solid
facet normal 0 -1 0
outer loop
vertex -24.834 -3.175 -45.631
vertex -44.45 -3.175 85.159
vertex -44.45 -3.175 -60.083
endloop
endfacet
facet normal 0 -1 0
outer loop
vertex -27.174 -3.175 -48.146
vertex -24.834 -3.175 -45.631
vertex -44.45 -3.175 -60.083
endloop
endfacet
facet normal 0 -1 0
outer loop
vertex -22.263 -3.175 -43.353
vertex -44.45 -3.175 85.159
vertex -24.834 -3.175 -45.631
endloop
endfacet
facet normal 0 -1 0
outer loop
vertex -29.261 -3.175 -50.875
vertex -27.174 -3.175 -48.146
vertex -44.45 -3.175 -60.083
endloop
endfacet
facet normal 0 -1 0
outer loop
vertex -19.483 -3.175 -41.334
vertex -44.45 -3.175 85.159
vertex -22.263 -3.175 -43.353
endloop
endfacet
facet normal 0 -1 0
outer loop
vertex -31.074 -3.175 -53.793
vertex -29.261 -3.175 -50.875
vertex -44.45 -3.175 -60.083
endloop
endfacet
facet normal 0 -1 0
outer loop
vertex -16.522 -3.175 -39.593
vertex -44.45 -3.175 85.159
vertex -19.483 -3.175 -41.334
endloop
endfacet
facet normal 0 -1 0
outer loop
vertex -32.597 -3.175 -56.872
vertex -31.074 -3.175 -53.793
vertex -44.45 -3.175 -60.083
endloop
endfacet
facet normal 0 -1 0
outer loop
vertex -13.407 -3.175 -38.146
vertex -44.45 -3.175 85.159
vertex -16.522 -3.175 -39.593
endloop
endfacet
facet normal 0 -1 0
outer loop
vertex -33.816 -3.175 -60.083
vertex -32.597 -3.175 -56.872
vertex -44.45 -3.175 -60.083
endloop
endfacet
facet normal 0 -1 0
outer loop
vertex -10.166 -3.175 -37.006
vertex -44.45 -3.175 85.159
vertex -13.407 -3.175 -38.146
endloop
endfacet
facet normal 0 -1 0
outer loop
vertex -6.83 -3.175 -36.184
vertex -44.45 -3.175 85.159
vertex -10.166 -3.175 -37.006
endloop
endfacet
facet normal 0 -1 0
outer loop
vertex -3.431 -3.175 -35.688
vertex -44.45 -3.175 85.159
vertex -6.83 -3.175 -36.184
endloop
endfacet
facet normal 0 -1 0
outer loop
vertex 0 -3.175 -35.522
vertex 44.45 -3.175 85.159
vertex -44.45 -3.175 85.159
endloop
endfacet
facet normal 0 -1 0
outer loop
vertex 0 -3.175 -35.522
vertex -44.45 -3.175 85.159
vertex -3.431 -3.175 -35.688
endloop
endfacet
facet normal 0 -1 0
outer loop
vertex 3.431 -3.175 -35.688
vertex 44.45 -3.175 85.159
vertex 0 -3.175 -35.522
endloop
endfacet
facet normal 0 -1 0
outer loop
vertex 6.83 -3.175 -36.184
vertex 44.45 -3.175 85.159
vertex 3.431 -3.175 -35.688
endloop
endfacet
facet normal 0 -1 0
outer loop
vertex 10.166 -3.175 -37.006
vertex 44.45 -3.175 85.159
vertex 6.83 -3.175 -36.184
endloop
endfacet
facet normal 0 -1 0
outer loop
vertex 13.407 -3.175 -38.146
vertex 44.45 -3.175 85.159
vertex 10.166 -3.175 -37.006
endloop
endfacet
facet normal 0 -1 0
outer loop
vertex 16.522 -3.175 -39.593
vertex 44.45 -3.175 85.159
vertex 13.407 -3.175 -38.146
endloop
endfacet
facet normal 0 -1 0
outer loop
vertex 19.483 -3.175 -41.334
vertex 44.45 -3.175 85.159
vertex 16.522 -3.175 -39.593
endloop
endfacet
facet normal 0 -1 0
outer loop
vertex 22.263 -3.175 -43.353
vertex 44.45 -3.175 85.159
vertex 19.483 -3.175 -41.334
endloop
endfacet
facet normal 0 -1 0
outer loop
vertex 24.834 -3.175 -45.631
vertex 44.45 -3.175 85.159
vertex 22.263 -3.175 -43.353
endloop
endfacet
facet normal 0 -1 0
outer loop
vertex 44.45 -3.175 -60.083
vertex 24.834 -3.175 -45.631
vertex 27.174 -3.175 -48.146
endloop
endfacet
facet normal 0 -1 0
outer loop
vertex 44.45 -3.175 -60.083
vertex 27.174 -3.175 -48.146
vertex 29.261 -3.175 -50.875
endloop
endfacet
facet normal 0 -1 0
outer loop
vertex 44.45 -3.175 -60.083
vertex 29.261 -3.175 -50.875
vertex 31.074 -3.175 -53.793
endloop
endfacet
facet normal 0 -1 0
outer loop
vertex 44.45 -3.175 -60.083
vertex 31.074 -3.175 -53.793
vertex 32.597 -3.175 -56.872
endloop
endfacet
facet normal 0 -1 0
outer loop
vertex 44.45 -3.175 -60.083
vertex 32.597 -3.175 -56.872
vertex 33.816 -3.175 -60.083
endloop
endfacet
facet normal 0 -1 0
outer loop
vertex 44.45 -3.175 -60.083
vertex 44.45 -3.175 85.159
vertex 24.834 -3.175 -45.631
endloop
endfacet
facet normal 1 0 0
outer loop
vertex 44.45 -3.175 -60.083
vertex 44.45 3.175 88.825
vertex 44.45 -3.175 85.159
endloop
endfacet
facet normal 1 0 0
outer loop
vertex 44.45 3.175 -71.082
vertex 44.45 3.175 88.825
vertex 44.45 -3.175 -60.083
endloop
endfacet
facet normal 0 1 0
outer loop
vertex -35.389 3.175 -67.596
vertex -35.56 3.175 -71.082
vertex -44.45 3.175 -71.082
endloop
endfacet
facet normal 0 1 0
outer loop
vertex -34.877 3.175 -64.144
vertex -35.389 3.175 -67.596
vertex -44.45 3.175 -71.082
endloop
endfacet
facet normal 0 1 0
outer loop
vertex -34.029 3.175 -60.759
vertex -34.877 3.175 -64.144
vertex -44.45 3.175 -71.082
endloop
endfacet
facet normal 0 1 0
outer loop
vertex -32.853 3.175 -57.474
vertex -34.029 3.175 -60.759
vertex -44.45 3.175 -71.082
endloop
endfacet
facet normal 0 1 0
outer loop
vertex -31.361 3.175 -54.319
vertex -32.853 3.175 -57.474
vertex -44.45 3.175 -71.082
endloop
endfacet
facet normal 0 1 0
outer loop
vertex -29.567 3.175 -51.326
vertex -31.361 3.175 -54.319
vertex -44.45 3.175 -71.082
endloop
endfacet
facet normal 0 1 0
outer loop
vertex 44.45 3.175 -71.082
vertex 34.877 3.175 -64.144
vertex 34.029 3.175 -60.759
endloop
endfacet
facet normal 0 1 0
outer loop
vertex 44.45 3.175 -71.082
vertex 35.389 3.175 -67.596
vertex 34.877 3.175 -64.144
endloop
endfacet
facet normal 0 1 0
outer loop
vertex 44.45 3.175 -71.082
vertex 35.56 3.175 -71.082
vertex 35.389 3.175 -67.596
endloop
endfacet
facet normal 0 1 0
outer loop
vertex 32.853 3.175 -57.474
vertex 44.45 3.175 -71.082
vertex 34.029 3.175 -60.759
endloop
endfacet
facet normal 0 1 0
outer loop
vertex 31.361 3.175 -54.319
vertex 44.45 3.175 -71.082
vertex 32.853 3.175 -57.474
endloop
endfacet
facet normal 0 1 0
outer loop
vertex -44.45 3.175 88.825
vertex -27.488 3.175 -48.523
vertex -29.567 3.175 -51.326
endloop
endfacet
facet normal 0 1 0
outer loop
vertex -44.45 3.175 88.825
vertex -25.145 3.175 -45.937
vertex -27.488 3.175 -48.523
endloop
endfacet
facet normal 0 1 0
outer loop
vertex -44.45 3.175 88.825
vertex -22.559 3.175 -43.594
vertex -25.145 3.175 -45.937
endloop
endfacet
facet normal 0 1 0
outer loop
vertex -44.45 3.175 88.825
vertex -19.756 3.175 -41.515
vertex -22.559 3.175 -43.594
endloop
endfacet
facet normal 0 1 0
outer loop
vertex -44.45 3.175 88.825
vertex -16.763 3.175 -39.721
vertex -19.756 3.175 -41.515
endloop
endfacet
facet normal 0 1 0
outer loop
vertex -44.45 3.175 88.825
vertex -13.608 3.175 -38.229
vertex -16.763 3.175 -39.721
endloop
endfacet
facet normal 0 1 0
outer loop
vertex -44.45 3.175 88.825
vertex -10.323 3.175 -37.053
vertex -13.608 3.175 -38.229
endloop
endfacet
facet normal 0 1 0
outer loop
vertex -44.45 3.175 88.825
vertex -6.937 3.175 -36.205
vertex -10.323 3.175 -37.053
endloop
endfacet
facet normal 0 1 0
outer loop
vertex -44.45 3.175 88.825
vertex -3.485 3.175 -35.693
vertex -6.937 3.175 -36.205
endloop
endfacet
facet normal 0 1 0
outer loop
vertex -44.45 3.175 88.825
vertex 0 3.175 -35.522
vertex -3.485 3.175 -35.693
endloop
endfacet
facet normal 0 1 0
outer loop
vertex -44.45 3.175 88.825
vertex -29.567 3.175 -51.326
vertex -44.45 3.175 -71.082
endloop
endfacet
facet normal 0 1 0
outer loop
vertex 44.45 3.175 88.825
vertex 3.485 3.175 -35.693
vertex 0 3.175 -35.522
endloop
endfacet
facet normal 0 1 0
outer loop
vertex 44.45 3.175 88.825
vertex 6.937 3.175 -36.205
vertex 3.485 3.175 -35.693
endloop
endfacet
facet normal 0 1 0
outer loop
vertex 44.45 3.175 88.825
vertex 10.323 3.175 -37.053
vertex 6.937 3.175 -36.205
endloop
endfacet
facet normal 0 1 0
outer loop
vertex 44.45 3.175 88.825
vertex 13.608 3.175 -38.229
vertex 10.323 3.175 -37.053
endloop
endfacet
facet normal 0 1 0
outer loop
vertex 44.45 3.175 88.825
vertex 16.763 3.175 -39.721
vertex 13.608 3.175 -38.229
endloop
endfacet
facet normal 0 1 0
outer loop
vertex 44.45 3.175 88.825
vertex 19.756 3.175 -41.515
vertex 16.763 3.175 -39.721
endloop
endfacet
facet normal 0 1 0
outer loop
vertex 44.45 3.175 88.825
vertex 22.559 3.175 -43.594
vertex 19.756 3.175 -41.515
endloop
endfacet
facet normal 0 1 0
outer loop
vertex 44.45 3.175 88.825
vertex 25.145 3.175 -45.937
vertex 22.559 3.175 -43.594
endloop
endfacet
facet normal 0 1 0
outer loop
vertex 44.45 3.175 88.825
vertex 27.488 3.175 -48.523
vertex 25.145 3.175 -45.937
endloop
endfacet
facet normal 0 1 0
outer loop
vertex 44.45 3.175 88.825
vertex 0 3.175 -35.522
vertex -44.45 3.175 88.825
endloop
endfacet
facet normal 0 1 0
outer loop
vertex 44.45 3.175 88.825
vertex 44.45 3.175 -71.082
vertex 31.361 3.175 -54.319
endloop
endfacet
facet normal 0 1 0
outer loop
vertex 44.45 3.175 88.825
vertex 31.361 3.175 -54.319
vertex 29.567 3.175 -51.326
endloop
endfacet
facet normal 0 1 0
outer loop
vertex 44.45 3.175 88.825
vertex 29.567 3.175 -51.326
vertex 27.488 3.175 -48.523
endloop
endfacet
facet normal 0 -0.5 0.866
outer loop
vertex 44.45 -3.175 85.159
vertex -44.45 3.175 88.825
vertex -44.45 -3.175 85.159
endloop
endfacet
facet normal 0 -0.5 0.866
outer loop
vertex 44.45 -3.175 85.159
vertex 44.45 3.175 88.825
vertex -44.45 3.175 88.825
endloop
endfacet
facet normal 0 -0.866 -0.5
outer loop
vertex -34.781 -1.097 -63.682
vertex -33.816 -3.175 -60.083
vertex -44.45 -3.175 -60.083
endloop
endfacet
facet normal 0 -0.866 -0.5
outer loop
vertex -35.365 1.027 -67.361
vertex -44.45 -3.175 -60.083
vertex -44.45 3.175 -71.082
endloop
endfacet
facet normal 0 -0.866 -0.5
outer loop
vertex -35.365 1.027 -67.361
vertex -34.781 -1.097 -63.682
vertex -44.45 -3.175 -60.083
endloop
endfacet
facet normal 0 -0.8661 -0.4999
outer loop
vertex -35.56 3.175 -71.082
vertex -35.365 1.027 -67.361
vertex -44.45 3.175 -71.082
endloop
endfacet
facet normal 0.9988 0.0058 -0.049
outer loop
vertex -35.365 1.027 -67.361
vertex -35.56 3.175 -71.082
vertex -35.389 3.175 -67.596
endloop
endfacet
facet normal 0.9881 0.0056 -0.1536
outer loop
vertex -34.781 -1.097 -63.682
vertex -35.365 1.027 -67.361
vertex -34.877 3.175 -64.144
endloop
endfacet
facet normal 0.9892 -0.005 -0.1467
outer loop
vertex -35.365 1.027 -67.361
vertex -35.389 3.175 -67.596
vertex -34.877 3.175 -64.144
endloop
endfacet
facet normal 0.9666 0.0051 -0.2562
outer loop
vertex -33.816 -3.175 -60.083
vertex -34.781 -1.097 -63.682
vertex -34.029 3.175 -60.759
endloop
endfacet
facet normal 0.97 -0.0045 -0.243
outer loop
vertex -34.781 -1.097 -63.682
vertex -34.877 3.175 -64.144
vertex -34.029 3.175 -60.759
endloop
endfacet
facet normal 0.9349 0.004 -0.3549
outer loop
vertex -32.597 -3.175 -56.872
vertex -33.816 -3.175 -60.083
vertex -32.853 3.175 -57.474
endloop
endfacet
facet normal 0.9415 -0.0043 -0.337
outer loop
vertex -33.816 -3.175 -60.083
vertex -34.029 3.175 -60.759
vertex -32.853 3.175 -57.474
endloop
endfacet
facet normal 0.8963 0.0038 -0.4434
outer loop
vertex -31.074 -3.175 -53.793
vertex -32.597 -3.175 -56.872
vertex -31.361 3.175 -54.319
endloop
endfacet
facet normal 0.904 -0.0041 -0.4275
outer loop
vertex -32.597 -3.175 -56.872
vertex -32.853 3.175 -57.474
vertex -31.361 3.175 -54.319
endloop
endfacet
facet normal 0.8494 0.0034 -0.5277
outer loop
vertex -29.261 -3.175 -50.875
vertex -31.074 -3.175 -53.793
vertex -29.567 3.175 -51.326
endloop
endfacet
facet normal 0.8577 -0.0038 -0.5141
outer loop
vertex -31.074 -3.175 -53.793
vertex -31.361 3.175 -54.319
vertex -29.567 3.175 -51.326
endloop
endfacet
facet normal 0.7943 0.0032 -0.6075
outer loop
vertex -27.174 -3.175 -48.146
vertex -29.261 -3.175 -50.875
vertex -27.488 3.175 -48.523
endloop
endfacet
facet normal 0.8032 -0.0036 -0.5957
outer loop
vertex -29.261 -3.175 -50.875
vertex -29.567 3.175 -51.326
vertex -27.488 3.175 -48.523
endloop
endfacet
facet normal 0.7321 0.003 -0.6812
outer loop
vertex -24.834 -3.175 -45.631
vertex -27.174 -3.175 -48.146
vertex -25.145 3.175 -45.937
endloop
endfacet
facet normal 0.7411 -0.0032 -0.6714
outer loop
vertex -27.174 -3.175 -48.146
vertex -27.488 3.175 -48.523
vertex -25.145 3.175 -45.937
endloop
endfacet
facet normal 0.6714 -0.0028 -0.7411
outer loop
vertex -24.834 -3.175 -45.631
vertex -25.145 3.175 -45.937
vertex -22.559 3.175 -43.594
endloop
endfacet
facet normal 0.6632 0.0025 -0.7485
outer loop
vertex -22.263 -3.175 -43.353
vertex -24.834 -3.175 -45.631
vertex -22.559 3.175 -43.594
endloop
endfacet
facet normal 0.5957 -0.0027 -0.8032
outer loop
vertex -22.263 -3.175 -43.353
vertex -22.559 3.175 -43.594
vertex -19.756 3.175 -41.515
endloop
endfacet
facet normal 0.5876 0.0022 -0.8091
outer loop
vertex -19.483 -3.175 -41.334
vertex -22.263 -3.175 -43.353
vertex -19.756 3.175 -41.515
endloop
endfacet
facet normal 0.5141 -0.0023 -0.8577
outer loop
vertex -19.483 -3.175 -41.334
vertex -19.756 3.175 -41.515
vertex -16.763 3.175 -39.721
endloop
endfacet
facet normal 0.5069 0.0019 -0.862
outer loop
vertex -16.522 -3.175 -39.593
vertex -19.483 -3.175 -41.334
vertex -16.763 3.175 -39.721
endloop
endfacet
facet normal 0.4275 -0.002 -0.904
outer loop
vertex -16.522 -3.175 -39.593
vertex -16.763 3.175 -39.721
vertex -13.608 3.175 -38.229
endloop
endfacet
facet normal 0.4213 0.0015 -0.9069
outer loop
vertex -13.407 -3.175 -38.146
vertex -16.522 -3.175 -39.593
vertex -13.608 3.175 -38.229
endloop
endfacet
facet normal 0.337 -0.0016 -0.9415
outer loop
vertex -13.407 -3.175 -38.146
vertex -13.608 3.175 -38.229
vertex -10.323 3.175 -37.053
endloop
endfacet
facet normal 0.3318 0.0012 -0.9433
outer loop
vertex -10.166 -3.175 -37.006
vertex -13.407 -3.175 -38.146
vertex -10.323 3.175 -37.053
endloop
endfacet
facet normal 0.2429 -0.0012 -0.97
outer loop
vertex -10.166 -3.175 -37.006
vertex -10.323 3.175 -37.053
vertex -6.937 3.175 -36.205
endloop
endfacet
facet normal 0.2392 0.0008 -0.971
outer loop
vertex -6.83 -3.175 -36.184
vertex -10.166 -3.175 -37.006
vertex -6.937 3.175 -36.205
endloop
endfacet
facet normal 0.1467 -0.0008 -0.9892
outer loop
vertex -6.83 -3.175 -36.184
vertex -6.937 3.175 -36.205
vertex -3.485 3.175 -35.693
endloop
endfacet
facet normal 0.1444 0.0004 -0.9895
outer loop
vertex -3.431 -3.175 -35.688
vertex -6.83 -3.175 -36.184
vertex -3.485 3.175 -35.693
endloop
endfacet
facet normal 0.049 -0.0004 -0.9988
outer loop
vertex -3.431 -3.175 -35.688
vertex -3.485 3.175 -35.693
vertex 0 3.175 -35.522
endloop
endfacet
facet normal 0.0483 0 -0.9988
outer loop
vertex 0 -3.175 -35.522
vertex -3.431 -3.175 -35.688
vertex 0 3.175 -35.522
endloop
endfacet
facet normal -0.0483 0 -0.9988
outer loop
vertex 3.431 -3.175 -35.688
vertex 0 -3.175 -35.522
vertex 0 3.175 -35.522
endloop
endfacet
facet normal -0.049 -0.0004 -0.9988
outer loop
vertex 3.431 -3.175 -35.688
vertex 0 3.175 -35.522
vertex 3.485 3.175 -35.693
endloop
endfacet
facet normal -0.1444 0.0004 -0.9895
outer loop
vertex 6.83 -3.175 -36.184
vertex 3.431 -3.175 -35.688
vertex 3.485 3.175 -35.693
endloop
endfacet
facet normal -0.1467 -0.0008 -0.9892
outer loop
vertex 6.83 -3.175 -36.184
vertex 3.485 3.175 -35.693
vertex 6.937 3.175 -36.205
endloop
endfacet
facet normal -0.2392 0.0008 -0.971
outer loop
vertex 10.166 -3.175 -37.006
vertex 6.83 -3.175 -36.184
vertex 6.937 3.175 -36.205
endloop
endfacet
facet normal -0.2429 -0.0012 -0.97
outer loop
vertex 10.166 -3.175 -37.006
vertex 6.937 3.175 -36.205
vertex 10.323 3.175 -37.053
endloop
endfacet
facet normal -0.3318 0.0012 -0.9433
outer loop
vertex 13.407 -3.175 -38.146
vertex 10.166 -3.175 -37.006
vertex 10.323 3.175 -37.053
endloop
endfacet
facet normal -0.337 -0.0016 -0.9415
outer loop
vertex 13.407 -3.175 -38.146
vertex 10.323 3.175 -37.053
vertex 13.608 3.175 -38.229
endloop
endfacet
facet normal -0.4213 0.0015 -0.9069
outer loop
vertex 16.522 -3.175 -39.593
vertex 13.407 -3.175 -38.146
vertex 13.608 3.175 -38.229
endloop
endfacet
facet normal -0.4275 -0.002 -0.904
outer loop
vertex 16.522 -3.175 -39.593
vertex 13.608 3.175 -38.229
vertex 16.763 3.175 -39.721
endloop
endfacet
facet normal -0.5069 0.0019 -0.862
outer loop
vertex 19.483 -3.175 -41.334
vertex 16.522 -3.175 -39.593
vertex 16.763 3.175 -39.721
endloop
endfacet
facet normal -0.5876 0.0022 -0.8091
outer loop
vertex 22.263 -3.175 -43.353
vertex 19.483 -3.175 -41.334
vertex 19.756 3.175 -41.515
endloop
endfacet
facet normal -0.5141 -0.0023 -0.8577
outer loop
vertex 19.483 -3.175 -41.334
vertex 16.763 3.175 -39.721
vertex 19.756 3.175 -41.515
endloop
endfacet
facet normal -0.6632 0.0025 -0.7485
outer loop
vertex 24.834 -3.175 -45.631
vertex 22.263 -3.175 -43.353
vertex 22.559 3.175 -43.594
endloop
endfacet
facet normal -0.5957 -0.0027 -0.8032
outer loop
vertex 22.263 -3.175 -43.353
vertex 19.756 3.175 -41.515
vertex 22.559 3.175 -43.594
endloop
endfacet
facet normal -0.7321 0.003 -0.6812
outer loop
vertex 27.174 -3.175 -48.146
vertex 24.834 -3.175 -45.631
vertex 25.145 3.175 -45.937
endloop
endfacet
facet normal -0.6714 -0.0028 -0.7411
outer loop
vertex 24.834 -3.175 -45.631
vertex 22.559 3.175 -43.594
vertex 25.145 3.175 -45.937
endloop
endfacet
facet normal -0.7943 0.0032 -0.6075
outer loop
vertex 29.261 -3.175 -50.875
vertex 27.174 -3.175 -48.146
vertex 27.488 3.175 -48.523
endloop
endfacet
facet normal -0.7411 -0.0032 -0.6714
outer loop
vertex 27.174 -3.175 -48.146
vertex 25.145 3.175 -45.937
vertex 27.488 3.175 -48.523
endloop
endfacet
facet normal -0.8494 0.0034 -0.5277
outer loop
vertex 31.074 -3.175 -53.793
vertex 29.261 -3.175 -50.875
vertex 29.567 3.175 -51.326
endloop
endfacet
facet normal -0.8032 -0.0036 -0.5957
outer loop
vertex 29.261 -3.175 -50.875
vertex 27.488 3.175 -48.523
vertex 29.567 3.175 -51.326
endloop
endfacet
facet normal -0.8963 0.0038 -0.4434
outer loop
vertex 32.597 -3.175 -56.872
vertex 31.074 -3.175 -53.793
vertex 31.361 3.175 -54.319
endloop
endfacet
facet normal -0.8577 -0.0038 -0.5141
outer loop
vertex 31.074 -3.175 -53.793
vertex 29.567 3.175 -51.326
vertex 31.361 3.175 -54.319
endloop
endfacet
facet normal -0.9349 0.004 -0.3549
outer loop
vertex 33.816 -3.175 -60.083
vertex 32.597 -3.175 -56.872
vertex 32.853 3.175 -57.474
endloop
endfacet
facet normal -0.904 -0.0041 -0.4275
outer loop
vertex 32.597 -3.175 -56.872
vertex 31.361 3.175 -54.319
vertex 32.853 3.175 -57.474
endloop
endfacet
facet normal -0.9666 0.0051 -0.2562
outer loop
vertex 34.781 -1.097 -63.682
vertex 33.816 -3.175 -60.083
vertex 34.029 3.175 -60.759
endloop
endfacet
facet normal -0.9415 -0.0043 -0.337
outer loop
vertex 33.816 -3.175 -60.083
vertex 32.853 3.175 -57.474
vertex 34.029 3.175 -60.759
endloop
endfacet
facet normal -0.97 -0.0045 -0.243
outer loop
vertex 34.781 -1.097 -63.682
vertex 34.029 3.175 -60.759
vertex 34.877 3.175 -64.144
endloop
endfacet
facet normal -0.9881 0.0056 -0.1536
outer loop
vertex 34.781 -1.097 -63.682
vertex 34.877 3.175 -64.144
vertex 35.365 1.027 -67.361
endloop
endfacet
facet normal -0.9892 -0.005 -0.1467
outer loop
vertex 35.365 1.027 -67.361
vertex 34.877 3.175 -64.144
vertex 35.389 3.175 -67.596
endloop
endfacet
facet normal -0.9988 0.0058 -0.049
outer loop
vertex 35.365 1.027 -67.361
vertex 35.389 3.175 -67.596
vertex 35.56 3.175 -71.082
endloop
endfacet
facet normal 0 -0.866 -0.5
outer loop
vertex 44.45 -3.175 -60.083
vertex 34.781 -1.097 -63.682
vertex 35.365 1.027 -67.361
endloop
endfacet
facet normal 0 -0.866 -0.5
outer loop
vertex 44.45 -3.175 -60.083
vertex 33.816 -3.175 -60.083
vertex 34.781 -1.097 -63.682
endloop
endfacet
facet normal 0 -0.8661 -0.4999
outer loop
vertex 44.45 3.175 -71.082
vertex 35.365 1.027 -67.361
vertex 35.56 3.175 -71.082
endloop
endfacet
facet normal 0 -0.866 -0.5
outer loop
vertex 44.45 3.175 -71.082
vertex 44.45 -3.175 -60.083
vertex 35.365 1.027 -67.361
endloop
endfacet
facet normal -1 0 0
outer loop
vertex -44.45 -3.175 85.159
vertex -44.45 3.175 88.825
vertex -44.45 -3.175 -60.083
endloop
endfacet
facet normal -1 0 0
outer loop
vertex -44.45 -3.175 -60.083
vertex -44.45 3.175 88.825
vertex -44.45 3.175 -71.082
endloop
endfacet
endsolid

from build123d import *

# Parameters (mm, degrees)
BOSS_EXTRUDE1_DEPTH = 44.45
CUT_EXTRUDE1_DEPTH  = 7.35


with BuildPart() as part:
    # Sketch3 → Boss-Extrude1 (new body, symmetric)
    with BuildSketch(Plane(origin=(0, 0, 0), x_dir=(0, 0, -1), z_dir=(1, 0, 0))):
        Polygon((-88.825470595, 3.175), (-85.159296386, -3.175), (60.083377372, -3.175), (71.0819, 3.175), align=None)
    extrude(amount=BOSS_EXTRUDE1_DEPTH, both=True)

    # Sketch5 → Cut-Extrude1 (cut, through all)
    with BuildSketch(Plane(origin=(0, 3.175, 0), x_dir=(1, 0, 0), z_dir=(0, 1, 0))):
        with BuildLine():
            ThreePointArc((-35.56, 71.0819), (0, 35.5219), (35.56, 71.0819))
            Line((35.56, 71.0819), (-35.56, 71.0819))
        make_face()
    extrude(amount=-CUT_EXTRUDE1_DEPTH, mode=Mode.SUBTRACT)


solid = part.part
